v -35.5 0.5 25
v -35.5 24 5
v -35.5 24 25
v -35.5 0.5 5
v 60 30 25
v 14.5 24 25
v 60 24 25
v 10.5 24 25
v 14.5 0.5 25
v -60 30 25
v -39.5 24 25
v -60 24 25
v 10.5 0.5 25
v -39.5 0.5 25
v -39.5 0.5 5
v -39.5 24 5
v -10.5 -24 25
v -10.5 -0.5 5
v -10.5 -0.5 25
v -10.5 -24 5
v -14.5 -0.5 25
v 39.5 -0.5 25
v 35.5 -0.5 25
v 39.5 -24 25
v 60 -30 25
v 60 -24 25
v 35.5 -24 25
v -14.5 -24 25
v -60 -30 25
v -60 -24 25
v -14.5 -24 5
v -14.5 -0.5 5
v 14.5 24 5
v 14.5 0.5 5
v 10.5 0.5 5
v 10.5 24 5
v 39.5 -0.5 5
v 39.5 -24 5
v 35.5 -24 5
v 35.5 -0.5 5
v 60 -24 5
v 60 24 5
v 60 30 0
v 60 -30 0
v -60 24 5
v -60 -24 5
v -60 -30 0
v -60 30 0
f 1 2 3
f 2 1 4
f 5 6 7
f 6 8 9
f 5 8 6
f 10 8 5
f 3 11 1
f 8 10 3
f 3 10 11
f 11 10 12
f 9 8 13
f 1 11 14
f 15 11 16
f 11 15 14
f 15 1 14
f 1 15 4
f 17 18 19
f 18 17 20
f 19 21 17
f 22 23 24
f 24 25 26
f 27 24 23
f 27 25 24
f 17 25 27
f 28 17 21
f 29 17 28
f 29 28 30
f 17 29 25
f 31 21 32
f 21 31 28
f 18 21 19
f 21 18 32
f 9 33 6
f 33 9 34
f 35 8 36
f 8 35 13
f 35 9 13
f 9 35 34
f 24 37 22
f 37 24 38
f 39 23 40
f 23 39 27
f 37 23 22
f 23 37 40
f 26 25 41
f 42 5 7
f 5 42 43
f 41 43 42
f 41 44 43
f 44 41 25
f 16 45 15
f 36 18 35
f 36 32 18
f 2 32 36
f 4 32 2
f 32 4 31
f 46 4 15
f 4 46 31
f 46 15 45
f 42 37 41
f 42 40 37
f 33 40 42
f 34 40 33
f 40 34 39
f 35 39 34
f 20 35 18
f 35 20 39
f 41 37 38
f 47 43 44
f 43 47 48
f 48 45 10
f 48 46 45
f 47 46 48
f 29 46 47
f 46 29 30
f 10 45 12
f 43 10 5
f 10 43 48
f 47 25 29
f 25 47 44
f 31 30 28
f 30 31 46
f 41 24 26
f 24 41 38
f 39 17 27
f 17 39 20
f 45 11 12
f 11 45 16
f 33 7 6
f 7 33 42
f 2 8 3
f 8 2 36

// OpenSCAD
$fn = 32;

// ----------------------------------------------------------------------
// Rib frame 120 x 60 x 25
// 4 ribs at 25 mm pitch, staggered
// ----------------------------------------------------------------------

// --- parameters (mm) ---
frame = [120, 60, 5];  // base plate size (x, y, z)
rail_w = 6;            // side rail width
ribs = 4;              // number of ribs
rib_t = 4;             // rib thickness
rib_h = 20;            // rib height above the base plate
pitch = 25;            // pitch between rib centres

// --- derived feature positions (mm) ---
span = (ribs - 1) * pitch;          // = 75   distance between the outer ribs
origin_x = -span / 2;               // = -37.5   X of the first rib
rib_len = frame[1] / 2 - rail_w + 0.5;  // = 24.5   length of a staggered rib
rib_y = 0.5 + rib_len / 2;          // = 12.75   Y of a staggered rib centre
row_offset = 2 * rib_y;             // = 25.5   distance between the two rows
feature_centers = [
  [origin_x + 0 * pitch, rib_y],
  [origin_x + 1 * pitch, -rib_y],
  [origin_x + 2 * pitch, rib_y],
  [origin_x + 3 * pitch, -rib_y]
];   // rib centre line, drives the rib loop

// base plate, two side rails, then the ribs read straight off feature_centers
union() {
  translate([-frame[0] / 2, -frame[1] / 2, 0]) cube(frame);
  translate([-frame[0] / 2, -frame[1] / 2, 0]) cube([frame[0], rail_w, frame[2] + rib_h]);
  translate([-frame[0] / 2, frame[1] / 2 - rail_w, 0]) cube([frame[0], rail_w, frame[2] + rib_h]);
  for (centre = feature_centers)
    translate([centre[0] - rib_t / 2, centre[1] - rib_len / 2, frame[2] - 1])
      cube([rib_t, rib_len, rib_h + 1]);
}
